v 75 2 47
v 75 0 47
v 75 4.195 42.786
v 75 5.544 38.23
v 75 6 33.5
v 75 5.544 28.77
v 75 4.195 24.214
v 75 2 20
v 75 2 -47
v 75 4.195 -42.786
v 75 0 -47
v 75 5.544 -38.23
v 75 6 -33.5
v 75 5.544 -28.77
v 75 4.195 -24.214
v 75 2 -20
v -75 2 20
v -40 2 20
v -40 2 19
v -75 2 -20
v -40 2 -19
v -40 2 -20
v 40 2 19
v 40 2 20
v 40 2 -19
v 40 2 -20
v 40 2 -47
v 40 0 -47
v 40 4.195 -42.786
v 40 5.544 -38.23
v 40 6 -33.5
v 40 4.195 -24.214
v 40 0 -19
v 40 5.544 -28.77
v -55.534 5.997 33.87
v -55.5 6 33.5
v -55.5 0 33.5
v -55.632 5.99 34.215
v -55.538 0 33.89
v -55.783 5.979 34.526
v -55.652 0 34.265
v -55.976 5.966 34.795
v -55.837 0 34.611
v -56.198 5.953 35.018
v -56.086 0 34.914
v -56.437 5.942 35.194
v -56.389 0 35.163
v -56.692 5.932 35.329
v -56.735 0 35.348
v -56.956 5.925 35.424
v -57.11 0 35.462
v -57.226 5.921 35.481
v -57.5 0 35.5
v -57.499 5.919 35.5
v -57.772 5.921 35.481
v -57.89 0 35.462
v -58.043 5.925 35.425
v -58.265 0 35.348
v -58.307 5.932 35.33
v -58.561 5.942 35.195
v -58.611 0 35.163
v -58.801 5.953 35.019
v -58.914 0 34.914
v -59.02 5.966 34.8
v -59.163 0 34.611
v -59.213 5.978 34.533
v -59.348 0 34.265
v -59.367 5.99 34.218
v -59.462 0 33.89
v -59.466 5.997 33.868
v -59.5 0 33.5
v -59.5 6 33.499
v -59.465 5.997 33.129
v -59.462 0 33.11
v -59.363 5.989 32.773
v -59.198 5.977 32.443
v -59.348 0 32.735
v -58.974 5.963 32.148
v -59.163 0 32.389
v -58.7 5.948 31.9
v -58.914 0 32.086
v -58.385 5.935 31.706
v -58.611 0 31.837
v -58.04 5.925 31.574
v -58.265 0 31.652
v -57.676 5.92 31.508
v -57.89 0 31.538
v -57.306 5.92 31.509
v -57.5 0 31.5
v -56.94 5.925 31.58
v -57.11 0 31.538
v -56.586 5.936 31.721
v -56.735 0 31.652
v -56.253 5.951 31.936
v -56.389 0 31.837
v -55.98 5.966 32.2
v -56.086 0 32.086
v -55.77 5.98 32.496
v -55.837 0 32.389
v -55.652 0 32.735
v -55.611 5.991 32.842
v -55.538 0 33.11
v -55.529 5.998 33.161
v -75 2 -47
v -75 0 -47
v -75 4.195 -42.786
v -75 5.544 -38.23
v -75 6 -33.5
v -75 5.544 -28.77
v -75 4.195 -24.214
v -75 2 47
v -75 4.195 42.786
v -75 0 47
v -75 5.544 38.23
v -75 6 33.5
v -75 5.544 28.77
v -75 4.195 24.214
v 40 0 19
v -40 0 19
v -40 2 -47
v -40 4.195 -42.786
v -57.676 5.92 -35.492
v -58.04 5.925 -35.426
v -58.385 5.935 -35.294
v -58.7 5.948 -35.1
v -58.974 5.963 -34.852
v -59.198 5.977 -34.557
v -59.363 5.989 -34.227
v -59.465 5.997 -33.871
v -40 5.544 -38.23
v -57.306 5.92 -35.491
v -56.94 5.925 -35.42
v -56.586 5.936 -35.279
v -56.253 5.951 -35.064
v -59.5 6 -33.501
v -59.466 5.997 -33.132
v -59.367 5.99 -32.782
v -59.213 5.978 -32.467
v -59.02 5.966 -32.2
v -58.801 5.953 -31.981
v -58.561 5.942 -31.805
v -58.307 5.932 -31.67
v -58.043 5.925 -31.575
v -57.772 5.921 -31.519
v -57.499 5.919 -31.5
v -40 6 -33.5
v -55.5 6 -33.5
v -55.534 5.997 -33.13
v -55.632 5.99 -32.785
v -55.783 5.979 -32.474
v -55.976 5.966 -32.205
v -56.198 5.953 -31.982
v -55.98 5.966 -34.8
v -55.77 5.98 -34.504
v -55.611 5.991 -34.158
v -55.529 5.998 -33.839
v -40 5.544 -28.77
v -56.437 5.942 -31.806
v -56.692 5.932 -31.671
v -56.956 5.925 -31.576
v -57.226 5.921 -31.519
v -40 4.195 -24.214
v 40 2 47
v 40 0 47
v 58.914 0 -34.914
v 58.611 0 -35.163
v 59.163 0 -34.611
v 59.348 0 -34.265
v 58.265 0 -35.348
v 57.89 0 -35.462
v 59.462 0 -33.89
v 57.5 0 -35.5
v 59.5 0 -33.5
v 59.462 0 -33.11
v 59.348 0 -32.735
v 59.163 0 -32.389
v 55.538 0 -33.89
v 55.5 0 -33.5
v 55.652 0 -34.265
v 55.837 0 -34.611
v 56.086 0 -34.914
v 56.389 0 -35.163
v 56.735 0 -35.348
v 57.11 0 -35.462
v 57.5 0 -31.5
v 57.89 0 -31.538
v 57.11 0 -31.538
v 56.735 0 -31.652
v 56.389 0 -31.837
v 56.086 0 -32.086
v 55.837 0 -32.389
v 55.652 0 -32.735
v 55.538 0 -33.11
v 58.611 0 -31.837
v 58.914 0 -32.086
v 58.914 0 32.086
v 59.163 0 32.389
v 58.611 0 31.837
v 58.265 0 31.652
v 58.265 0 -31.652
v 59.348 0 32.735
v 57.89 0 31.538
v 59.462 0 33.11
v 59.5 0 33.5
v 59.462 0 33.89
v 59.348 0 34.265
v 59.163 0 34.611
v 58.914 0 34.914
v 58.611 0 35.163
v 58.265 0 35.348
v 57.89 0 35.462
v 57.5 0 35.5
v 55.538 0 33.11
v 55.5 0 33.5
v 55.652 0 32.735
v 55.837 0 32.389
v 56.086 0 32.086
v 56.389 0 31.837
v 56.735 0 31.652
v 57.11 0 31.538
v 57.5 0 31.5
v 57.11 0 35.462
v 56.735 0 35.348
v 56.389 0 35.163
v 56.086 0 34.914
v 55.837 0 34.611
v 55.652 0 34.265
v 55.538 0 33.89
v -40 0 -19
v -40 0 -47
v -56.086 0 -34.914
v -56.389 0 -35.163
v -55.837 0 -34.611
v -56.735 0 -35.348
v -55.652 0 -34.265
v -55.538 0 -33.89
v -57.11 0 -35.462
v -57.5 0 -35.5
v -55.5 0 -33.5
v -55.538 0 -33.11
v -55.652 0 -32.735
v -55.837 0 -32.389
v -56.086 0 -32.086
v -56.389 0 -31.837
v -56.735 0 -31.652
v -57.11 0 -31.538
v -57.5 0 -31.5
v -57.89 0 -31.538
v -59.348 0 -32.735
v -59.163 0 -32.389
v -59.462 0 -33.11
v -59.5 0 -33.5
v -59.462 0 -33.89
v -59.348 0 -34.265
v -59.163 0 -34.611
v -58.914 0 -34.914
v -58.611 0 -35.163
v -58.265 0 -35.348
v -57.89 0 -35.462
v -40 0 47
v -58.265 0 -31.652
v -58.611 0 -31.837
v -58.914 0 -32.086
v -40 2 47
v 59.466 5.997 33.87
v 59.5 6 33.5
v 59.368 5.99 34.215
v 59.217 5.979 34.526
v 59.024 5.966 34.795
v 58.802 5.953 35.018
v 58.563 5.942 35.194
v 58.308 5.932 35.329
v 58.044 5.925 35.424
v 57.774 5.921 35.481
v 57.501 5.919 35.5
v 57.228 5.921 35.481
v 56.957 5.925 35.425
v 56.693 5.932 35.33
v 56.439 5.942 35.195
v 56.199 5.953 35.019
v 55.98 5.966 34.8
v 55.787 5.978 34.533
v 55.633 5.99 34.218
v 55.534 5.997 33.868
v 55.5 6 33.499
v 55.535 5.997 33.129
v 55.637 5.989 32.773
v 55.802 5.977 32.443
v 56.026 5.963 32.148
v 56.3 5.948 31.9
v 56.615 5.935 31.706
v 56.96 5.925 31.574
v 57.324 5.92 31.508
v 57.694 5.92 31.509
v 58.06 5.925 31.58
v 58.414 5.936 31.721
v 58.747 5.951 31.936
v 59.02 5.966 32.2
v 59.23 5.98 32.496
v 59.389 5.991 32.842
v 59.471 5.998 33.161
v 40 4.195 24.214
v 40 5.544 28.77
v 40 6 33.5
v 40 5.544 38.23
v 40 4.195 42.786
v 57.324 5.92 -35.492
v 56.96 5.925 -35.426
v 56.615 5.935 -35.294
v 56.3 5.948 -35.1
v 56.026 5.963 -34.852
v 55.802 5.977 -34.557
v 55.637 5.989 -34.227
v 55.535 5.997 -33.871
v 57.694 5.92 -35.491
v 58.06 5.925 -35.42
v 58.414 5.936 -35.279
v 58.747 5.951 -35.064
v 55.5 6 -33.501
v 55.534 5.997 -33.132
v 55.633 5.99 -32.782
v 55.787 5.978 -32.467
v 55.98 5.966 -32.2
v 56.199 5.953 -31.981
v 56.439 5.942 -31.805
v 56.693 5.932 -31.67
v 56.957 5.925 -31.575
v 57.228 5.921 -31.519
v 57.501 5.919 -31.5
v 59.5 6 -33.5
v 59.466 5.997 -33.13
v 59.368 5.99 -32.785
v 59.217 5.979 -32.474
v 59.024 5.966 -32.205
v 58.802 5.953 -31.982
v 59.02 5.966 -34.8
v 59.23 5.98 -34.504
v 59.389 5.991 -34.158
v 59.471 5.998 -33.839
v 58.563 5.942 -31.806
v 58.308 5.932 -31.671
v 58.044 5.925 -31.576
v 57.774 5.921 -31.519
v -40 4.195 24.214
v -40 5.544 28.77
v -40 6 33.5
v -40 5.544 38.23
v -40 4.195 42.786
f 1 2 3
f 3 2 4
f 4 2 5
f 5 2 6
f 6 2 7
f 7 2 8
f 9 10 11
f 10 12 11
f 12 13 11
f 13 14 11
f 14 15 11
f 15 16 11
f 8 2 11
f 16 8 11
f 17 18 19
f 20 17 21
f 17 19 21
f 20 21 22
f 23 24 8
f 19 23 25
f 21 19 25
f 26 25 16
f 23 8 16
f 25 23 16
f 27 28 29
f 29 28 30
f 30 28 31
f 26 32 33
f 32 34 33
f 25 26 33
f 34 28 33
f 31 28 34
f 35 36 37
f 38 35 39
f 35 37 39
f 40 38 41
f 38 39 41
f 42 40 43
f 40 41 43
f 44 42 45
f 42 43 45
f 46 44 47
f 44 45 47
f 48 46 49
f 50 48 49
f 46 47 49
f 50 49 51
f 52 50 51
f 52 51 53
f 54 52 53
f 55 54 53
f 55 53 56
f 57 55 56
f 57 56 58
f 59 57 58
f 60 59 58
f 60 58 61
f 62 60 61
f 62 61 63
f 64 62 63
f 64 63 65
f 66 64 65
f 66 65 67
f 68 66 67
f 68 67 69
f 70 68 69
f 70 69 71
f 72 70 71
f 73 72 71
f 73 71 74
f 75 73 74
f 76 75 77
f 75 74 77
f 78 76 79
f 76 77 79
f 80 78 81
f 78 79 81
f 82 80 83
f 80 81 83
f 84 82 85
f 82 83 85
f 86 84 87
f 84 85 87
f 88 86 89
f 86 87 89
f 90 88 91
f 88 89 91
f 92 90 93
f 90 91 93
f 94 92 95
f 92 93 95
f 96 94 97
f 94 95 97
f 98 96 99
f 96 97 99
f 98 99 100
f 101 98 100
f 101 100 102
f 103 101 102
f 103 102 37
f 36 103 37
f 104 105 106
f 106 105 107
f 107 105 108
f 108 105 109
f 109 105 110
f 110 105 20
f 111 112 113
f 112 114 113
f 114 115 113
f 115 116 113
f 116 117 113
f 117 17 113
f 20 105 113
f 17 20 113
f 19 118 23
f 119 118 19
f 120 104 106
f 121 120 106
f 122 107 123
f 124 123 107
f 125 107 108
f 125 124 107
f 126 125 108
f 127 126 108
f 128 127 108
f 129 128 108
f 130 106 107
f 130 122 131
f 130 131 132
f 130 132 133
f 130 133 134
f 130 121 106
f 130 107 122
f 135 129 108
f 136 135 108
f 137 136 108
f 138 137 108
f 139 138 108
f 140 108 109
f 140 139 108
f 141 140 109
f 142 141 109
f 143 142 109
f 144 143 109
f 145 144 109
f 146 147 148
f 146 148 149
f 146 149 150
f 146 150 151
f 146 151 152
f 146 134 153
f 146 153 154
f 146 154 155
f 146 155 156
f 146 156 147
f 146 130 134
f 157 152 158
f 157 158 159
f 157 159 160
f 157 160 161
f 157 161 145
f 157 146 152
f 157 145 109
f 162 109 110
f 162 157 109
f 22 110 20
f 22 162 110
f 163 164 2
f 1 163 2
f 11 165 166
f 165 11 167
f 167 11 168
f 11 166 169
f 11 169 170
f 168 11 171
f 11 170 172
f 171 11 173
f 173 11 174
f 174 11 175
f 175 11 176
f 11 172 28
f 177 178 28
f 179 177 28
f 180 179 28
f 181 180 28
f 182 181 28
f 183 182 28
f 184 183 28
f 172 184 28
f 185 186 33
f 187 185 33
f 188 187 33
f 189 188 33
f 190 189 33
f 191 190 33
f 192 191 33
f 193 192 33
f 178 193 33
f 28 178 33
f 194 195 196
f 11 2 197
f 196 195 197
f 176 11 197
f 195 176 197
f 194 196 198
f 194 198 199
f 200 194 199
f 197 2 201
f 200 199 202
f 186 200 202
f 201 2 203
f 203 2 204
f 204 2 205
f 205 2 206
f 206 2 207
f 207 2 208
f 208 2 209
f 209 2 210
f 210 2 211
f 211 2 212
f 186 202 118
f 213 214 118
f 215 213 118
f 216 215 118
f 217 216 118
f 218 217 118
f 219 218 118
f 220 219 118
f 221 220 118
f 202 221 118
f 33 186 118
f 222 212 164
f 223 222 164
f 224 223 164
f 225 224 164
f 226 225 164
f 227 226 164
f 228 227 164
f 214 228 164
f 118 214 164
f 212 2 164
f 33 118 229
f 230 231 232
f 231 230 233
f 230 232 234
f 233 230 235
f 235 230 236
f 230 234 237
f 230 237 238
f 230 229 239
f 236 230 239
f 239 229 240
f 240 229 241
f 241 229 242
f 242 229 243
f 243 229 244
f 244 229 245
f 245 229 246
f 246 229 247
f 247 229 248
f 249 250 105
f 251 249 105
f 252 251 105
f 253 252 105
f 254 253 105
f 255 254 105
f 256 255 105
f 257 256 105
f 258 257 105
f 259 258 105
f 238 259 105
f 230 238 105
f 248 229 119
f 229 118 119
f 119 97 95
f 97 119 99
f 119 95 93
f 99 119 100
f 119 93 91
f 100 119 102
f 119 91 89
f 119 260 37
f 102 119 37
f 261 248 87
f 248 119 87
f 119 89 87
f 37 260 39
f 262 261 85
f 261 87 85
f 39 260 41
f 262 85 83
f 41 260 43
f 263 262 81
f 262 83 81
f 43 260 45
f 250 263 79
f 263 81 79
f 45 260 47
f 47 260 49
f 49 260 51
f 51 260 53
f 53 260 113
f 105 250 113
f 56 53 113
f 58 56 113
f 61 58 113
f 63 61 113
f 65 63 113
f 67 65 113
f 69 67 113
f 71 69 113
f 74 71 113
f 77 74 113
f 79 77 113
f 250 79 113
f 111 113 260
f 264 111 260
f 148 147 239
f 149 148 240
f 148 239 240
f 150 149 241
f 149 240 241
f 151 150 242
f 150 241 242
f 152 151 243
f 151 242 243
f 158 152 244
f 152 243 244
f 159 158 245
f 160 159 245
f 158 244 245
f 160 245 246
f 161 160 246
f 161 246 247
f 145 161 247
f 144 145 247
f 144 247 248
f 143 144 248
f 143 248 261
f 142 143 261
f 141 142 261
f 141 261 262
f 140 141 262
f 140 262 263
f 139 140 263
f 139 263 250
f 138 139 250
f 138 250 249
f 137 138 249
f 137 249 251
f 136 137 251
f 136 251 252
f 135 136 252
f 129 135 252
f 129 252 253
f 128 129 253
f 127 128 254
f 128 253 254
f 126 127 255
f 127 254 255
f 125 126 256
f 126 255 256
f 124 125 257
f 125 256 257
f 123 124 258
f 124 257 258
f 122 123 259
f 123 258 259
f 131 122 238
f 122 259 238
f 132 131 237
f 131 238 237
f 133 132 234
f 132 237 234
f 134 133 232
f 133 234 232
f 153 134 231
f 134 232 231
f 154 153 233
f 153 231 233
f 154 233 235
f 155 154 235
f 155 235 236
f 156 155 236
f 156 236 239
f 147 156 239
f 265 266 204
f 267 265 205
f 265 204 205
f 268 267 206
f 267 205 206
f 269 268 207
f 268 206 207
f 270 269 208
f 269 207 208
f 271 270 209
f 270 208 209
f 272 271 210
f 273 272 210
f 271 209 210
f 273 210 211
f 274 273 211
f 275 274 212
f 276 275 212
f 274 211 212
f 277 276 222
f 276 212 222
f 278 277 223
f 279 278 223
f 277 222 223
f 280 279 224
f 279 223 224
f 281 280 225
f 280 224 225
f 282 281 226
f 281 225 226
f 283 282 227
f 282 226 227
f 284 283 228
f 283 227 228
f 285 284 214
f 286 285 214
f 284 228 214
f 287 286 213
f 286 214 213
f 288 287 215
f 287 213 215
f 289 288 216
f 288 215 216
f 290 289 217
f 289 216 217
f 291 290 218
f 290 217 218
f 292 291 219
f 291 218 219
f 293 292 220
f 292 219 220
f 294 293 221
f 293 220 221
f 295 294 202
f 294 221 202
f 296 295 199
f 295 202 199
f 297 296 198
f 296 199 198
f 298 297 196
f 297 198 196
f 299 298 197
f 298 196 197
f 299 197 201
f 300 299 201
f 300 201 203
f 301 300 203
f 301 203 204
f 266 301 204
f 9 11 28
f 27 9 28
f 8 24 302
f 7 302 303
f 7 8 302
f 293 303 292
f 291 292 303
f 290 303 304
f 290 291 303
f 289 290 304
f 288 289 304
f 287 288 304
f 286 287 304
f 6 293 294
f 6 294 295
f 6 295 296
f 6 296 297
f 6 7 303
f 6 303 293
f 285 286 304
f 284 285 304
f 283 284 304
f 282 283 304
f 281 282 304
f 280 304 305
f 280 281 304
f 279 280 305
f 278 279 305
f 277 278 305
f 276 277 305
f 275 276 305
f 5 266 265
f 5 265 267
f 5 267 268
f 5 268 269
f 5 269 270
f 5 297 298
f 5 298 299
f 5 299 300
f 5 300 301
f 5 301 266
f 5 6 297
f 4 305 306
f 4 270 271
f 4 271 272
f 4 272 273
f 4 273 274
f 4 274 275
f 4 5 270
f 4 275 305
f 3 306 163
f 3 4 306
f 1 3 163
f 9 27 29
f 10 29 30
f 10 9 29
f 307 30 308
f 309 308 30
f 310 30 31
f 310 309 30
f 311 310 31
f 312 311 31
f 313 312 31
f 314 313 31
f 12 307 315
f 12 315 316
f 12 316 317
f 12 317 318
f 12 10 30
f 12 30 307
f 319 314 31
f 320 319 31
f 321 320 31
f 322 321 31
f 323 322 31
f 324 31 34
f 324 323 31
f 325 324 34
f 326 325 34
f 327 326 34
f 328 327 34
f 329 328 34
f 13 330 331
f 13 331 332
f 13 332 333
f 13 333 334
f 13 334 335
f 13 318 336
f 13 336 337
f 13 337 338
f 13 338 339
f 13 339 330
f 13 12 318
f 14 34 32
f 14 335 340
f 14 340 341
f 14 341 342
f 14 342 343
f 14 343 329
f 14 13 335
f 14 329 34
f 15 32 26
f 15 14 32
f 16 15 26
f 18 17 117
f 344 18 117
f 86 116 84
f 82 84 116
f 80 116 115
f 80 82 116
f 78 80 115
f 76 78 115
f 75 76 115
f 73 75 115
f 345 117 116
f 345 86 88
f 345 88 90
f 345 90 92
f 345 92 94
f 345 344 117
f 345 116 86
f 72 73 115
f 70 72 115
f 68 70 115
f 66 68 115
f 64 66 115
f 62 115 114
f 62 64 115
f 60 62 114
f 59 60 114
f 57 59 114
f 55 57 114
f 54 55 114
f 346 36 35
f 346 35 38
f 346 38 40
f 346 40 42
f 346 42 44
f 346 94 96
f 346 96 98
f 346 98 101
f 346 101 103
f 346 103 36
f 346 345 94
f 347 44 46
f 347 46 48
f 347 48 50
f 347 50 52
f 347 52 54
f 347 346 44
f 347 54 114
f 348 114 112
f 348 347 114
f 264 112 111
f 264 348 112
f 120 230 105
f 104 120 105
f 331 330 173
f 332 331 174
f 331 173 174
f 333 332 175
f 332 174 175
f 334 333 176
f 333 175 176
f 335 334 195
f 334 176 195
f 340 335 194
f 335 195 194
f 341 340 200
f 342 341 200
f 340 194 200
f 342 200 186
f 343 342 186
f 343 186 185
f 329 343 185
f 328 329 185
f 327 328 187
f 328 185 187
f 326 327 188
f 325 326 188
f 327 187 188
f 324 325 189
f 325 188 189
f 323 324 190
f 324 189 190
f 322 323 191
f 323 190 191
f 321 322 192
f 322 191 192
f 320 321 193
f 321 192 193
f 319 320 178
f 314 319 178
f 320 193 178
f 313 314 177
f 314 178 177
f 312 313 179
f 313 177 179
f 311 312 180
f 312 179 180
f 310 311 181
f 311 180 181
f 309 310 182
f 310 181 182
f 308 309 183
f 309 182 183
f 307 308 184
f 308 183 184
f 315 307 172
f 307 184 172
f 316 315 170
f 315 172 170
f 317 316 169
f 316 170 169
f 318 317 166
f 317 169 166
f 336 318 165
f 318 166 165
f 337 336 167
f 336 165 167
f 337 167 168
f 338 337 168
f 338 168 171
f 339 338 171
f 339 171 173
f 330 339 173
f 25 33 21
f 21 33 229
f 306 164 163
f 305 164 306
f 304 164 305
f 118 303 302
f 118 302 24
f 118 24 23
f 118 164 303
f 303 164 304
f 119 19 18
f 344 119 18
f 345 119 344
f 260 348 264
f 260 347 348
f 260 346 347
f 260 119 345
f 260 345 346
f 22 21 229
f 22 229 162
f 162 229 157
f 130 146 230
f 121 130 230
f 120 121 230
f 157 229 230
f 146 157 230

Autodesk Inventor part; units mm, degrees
ref_plane "YZ Plane" through (0, 0, 0) normal (1, 0, 0) x (0, 1, 0)
ref_plane "XZ Plane" through (0, 0, 0) normal (0, 1, 0) x (-1, 0, 0)
ref_plane "XY Plane" through (0, 0, 0) normal (0, 0, 1) x (1, 0, 0)
sketch "Main Base Sketch" plane through (0, 0, 0) normal (0, 1, 0) x (-1, 0, 0)
  line L0 (75, -47) -> (75, 47)
  line L1 (-75, 47) -> (-75, -47)
  line L2 (-75, -47) -> (75, 47) construction
  line L3 (75, -47) -> (-75, 47) construction
  line L4 (-40, -47) -> (-40, -19)
  line L5 (-40, -19) -> (40, -19)
  line L6 (40, -19) -> (40, -47)
  line L7 (40, 19) -> (40, 47)
  line L8 (-40, 19) -> (40, 19)
  line L9 (-40, 47) -> (-40, 19)
  line L10 (75, 47) -> (40, 47)
  line L11 (-40, 47) -> (-75, 47)
  line L12 (-75, -47) -> (-40, -47)
  line L13 (40, -47) -> (75, -47)
  point P0 (0, 0)
  point P1 (0, 0)
  dimension "d0" = 94
  dimension "d1" = 35
  dimension "d2" = 35
  dimension "d3" = 80
  dimension "d4" = 150
  dimension "d5" = 28
  dimension "d6" = 94
  dimension "d8" = 80
  dimension "d9" = 28
  dimension "d27" = 28
  dimension "d28" = 38
  dimension "d37" = 0
extrude "Main Base Extrusion" add sketch "Main Base Sketch" along normal blind 6
sketch "Middle Cut Sketch" plane through (0, 6, 0) normal (0, 1, 0) x (1, 0, 0)
  line L0 (-75, 47) -> (-75, -47) projected
  line L1 (75, 19) -> (-75, 19)
  line L2 (-75, 19) -> (-75, -19)
  line L3 (-75, -19) -> (75, -19)
  line L4 (75, -19) -> (75, 19)
  line L5 (-40, -19) -> (40, -19) projected
  line L6 (75, -47) -> (75, 47) projected
  line L7 (40, 19) -> (-40, 19) projected
  point P0 (0, 0)
  dimension "d18" = 0
  dimension "d19" = 0
  dimension "d34" = 0
extrude "Middle Cut" cut sketch "Middle Cut Sketch" against normal blind 4
sketch "Arc Sketch" plane through (75, 0, 47) normal (1, 0, 0) x (0, 0, -1)
  line L0 (27, 9.4354) -> (27, -6.3008)
  line L1 (13.5, 8.8022) -> (13.5, -9.7521)
  line L2 (-4.6363, 2) -> (37.5698, 2)
  line L3 (94, 0) -> (0, 0) projected
  arc A0 (27, 2) -> (0, 2) centre (13.5, -18.7813) ccw
  line L4 (0, 7.9962) -> (0, -1.9448)
  line L5 (0, 0) -> (0, 6) projected
  line L6 (0, 6) -> (0, 2)
  line L7 (28, 6) -> (0, 6) projected
  line L8 (0, 6) -> (28, 6)
  line L9 (28, 2) -> (28, 6) projected
  line L10 (28, 6) -> (28, 2)
  line L11 (28, 2) -> (27, 2)
  line L12 (94, 0) -> (94, 6) projected
  dimension "d25" = 13.5
  dimension "d26" = 2
  dimension "d29" = 13.5
  dimension "d30" = 27
extrude "Arc Cut" cut sketch "Arc Sketch" against normal through all contours L7 L9 L2 L0 | L0 A0 L7 | A0 L4 L7
mirror "Arc Mirror" about plane through (0, 0, 0) normal (0, 0, 1) of "Arc Cut"
sketch "Arc Holes Sketch" plane through (0, 0, 0) normal (0, -1, 0) x (1, 0, 0)
  circle A0 centre (57.5, 33.5) radius 2
  line L0 (75, -47) -> (75, 47) projected
  line L1 (40, 47) -> (40, 19) projected
  line L2 (40, 19) -> (-40, 19) projected
  line L3 (75, 47) -> (40, 47) projected
  line L4 (104.495, 0) -> (-129.4816, 0)
  line L5 (0, -57.7002) -> (0, 85.929)
  circle A1 centre (57.5, -33.5) radius 2
  circle A2 centre (-57.5, 33.5) radius 2
  circle A3 centre (-57.5, -33.5) radius 2
  point P0 (0, 0)
  dimension "d38" = 4
  dimension "d39" = 17.5
  dimension "d40" = 17.5
  dimension "d41" = 14.5
  dimension "d42" = 13.5
extrude "Arc Holes Cut" cut sketch "Arc Holes Sketch" against normal through all contours A0 | A1 | A2 | A3
properties part number "TapeMeasureBracketTop"
